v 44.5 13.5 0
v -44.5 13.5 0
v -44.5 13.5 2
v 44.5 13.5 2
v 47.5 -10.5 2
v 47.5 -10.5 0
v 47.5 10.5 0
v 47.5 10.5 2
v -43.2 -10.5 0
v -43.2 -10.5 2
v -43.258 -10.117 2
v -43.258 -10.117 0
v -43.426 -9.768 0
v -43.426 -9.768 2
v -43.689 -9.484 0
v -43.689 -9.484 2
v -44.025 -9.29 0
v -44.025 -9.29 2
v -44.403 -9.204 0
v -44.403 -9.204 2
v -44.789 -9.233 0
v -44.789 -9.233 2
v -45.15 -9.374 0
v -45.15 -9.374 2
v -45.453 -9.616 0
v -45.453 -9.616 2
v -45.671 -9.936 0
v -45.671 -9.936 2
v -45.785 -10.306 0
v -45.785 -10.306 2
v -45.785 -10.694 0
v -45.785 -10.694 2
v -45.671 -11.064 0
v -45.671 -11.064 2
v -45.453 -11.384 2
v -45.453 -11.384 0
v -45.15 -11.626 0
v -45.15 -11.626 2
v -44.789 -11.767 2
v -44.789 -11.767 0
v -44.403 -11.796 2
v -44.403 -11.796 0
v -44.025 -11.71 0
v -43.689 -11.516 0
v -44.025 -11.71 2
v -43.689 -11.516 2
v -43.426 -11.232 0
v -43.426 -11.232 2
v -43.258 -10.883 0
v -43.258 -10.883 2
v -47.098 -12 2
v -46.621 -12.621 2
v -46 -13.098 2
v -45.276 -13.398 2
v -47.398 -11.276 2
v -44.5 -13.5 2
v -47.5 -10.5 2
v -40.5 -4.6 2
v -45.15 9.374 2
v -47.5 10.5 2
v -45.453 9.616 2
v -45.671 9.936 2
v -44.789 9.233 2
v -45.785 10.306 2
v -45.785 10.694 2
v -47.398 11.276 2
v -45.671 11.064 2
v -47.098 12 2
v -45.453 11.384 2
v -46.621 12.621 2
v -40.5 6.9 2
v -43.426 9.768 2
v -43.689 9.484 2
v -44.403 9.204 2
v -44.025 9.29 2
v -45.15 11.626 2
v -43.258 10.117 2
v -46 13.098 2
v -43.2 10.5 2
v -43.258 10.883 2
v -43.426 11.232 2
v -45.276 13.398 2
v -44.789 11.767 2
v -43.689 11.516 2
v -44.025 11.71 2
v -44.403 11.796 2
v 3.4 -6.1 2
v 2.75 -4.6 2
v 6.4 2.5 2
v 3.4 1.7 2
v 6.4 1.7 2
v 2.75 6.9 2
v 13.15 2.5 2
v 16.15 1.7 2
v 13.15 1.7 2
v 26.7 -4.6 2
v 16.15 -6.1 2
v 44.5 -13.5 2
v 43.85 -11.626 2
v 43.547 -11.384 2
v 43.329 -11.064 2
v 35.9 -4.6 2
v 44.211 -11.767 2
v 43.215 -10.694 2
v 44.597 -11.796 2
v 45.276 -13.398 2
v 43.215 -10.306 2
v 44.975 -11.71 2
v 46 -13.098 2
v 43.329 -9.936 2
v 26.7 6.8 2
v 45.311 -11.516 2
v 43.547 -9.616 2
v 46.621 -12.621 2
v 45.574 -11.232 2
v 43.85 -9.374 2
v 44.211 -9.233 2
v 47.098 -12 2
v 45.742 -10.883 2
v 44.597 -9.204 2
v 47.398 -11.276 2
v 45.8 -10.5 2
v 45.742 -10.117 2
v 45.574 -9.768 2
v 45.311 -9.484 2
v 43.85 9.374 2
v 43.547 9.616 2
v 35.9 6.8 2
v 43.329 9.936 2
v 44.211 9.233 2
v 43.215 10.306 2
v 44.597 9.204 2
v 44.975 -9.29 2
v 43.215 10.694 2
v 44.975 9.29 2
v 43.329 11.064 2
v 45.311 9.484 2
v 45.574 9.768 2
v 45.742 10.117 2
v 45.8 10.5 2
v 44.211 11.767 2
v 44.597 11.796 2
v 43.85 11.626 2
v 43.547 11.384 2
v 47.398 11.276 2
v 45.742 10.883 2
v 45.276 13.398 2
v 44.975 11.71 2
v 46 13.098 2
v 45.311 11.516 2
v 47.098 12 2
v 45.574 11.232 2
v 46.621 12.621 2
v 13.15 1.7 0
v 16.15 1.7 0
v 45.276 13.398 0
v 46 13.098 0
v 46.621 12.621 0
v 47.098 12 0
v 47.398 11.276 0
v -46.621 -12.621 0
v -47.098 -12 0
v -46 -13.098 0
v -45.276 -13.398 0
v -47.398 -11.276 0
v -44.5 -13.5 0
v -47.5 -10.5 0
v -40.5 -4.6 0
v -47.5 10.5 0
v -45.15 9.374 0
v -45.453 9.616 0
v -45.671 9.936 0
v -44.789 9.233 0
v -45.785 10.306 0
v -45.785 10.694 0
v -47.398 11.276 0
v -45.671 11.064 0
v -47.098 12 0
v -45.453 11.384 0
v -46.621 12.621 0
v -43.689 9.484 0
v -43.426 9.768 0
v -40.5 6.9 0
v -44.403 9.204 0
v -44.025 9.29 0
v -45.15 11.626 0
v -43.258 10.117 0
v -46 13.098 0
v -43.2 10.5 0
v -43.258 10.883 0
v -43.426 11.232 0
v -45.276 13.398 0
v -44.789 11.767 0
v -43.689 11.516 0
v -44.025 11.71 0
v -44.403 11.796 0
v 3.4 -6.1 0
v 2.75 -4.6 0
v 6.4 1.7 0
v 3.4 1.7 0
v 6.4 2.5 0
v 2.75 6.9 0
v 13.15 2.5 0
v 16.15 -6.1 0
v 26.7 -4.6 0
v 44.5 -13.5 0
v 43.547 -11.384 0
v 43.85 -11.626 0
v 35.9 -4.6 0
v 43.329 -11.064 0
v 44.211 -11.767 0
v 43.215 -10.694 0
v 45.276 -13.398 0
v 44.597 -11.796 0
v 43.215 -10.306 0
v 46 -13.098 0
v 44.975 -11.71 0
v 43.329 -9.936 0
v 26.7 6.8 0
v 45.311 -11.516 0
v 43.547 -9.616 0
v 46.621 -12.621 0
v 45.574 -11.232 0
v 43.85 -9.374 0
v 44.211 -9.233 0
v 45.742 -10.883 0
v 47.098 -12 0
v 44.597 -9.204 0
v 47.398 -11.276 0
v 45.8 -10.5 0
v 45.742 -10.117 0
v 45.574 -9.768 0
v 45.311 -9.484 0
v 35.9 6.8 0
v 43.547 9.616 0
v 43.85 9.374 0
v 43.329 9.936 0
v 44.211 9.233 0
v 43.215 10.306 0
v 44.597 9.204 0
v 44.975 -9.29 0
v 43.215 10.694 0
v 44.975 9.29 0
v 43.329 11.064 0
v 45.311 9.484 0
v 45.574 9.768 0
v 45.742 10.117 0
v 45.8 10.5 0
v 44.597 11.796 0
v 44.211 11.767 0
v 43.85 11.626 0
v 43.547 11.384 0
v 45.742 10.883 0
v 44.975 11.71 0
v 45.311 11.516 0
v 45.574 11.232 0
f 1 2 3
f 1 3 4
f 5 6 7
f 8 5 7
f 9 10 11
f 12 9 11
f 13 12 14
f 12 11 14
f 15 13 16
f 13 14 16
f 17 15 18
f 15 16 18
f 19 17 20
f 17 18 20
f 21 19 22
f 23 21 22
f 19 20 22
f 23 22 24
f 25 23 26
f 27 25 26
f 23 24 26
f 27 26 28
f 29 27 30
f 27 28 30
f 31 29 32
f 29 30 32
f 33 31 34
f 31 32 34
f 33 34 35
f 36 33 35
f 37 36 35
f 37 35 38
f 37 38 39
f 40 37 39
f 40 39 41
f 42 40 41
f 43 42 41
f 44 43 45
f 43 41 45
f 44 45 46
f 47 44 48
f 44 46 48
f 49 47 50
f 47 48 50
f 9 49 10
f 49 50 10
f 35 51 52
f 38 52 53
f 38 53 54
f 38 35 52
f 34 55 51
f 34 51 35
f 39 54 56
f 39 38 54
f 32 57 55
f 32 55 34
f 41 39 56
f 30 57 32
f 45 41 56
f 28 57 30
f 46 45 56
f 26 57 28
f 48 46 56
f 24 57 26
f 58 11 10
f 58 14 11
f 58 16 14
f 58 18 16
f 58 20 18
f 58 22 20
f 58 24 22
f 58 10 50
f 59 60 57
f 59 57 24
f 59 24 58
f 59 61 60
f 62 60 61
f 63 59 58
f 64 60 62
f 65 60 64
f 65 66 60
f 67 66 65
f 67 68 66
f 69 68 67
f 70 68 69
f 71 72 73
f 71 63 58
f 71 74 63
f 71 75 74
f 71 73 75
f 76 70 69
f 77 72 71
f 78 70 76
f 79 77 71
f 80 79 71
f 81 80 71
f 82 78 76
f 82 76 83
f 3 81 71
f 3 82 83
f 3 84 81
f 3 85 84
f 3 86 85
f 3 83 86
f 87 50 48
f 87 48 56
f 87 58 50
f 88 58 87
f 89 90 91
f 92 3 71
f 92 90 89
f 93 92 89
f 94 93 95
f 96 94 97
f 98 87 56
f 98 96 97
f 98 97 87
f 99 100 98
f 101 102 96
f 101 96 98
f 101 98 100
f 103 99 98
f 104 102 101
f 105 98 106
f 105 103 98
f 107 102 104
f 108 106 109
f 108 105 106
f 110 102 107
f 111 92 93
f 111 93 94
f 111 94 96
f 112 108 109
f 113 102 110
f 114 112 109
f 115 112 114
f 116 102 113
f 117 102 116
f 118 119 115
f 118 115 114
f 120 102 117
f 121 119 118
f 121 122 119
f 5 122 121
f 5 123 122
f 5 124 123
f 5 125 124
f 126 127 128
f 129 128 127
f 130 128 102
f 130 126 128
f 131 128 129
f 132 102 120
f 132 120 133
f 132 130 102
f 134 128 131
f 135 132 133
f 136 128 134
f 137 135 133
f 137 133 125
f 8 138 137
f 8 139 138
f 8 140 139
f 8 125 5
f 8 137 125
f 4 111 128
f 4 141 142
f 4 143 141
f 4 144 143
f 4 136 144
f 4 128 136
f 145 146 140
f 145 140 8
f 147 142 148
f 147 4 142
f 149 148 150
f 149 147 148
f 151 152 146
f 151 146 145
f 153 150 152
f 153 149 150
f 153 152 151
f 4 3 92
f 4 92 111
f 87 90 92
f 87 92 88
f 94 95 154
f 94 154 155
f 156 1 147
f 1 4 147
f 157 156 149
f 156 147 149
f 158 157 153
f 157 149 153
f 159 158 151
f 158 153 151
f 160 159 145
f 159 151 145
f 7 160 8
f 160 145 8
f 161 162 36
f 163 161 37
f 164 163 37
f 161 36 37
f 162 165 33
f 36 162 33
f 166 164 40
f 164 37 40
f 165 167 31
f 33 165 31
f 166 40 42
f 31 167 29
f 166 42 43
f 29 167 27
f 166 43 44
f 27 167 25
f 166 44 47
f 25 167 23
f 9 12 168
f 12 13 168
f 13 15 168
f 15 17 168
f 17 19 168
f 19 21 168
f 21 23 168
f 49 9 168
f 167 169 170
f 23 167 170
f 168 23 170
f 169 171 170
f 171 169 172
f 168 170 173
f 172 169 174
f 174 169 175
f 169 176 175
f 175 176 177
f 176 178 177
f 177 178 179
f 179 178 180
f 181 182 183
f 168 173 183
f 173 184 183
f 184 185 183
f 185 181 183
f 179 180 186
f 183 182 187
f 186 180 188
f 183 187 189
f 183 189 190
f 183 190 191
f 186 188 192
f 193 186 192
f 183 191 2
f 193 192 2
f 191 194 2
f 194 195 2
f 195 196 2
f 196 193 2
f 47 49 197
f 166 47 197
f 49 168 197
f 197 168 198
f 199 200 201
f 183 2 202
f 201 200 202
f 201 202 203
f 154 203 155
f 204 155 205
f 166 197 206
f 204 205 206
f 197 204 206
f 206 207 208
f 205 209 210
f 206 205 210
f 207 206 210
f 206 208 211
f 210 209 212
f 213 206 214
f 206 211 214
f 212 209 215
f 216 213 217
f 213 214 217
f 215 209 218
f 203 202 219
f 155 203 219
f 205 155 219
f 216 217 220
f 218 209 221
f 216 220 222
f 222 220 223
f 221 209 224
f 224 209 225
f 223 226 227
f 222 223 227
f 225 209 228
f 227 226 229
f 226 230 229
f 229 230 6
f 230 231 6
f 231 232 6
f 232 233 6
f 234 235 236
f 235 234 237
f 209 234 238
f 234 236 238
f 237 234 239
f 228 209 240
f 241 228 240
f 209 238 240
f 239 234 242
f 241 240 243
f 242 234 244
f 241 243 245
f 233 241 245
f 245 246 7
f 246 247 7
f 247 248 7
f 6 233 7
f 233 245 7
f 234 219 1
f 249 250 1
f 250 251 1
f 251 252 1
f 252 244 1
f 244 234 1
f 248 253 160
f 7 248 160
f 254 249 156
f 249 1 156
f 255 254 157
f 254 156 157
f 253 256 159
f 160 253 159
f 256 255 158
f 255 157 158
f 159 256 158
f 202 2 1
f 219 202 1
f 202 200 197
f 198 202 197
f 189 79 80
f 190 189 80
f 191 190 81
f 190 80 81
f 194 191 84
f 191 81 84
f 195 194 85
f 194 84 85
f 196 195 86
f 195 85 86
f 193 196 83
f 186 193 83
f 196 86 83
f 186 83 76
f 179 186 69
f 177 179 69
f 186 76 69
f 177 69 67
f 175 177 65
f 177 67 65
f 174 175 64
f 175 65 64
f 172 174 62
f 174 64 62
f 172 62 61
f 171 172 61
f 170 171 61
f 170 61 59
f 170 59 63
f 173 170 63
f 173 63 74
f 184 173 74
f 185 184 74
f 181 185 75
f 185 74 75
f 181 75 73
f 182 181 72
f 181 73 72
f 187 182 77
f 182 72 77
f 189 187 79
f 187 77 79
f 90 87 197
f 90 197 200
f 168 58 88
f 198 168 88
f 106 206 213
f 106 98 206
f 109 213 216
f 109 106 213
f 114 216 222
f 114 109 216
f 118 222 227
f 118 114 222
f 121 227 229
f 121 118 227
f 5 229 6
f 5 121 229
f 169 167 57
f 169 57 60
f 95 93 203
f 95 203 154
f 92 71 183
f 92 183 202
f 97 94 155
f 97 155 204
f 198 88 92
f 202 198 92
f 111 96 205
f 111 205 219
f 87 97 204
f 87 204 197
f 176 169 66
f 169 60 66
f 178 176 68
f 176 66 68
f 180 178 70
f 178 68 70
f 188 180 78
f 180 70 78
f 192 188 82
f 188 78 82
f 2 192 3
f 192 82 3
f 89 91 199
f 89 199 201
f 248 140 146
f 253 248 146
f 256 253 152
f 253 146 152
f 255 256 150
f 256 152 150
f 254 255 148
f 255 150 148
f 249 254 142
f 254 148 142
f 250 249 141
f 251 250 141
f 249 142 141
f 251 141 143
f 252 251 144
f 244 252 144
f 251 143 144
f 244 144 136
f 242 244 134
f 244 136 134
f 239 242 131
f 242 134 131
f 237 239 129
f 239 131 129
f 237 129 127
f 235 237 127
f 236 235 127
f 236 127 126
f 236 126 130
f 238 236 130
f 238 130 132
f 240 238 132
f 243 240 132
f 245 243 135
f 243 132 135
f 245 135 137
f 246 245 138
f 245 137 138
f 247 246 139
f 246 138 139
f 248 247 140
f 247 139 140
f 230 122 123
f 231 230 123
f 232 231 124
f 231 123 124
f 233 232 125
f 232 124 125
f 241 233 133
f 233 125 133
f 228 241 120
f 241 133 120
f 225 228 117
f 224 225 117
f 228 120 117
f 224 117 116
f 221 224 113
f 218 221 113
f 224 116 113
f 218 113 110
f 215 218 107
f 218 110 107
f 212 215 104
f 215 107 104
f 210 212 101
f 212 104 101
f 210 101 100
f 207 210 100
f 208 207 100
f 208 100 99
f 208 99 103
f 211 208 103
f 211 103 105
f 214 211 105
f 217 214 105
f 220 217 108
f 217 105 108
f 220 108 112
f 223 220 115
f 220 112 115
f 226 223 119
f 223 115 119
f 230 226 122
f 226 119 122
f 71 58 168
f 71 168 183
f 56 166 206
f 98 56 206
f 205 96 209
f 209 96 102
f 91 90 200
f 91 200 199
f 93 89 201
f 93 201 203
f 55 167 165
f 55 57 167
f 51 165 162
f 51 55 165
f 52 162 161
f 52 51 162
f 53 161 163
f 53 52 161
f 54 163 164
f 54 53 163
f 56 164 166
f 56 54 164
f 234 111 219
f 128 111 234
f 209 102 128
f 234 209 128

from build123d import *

# Parameters (mm, degrees)
SKETCH_W        = 95
SKETCH_H        = 27
PAD_DEPTH       = 2
SKETCH001_R     = 1.3
POCKET_DEPTH    = 2
FILLET_R        = 3
SKETCH002_W     = 9.2
SKETCH002_H     = 11.4
POCKET001_DEPTH = 2
SKETCH004_W     = 43.25
SKETCH004_H     = 11.5
POCKET002_DEPTH = 2
POCKET003_DEPTH = 2


with BuildPart() as part:
    # Sketch → Pad (new body)
    with BuildSketch(Plane.XY):
        Rectangle(SKETCH_W, SKETCH_H)
    extrude(amount=PAD_DEPTH)

    # Sketch001 (on Face6 of Pad) → Pocket (cut)
    with BuildSketch(Plane.XY.offset(2)):
        with Locations((-44.5, 10.5)):
            Circle(SKETCH001_R)
        with Locations((44.5, 10.5)):
            Circle(SKETCH001_R)
        with Locations((44.5, -10.5)):
            Circle(SKETCH001_R)
        with Locations((-44.5, -10.5)):
            Circle(SKETCH001_R)
    extrude(amount=-POCKET_DEPTH, mode=Mode.SUBTRACT)

    # Fillet
    fillet_edges = [part.edges().sort_by_distance(p)[0] for p in [
        (-47.5, -13.5, 1),
        (47.5, -13.5, 1),
        (47.5, 13.5, 1),
        (-47.5, 13.5, 1),
    ]]
    fillet(fillet_edges, radius=FILLET_R)

    # Sketch002 (on Face5 of Fillet) → Pocket001 (cut)
    with BuildSketch(Plane.XY.offset(2)):
        with Locations((31.3, 1.1)):
            Rectangle(SKETCH002_W, SKETCH002_H)
    extrude(amount=-POCKET001_DEPTH, mode=Mode.SUBTRACT)

    # Sketch004 (on Face5 of Pocket001) → Pocket002 (cut)
    with BuildSketch(Plane.XY.offset(2)):
        with Locations((-18.875, 1.15)):
            Rectangle(SKETCH004_W, SKETCH004_H)
    extrude(amount=-POCKET002_DEPTH, mode=Mode.SUBTRACT)

    # Sketch005 (on Face5 of Pocket002) → Pocket003 (cut)
    with BuildSketch(Plane.XY.offset(2)):
        Polygon((16.15, 1.7), (16.15, -6.1), (3.4, -6.1), (3.4, 1.7), (6.4, 1.7), (6.4, 2.5), (13.15, 2.5), (13.15, 1.7), align=None)
    extrude(amount=-POCKET003_DEPTH, mode=Mode.SUBTRACT)


solid = part.part
